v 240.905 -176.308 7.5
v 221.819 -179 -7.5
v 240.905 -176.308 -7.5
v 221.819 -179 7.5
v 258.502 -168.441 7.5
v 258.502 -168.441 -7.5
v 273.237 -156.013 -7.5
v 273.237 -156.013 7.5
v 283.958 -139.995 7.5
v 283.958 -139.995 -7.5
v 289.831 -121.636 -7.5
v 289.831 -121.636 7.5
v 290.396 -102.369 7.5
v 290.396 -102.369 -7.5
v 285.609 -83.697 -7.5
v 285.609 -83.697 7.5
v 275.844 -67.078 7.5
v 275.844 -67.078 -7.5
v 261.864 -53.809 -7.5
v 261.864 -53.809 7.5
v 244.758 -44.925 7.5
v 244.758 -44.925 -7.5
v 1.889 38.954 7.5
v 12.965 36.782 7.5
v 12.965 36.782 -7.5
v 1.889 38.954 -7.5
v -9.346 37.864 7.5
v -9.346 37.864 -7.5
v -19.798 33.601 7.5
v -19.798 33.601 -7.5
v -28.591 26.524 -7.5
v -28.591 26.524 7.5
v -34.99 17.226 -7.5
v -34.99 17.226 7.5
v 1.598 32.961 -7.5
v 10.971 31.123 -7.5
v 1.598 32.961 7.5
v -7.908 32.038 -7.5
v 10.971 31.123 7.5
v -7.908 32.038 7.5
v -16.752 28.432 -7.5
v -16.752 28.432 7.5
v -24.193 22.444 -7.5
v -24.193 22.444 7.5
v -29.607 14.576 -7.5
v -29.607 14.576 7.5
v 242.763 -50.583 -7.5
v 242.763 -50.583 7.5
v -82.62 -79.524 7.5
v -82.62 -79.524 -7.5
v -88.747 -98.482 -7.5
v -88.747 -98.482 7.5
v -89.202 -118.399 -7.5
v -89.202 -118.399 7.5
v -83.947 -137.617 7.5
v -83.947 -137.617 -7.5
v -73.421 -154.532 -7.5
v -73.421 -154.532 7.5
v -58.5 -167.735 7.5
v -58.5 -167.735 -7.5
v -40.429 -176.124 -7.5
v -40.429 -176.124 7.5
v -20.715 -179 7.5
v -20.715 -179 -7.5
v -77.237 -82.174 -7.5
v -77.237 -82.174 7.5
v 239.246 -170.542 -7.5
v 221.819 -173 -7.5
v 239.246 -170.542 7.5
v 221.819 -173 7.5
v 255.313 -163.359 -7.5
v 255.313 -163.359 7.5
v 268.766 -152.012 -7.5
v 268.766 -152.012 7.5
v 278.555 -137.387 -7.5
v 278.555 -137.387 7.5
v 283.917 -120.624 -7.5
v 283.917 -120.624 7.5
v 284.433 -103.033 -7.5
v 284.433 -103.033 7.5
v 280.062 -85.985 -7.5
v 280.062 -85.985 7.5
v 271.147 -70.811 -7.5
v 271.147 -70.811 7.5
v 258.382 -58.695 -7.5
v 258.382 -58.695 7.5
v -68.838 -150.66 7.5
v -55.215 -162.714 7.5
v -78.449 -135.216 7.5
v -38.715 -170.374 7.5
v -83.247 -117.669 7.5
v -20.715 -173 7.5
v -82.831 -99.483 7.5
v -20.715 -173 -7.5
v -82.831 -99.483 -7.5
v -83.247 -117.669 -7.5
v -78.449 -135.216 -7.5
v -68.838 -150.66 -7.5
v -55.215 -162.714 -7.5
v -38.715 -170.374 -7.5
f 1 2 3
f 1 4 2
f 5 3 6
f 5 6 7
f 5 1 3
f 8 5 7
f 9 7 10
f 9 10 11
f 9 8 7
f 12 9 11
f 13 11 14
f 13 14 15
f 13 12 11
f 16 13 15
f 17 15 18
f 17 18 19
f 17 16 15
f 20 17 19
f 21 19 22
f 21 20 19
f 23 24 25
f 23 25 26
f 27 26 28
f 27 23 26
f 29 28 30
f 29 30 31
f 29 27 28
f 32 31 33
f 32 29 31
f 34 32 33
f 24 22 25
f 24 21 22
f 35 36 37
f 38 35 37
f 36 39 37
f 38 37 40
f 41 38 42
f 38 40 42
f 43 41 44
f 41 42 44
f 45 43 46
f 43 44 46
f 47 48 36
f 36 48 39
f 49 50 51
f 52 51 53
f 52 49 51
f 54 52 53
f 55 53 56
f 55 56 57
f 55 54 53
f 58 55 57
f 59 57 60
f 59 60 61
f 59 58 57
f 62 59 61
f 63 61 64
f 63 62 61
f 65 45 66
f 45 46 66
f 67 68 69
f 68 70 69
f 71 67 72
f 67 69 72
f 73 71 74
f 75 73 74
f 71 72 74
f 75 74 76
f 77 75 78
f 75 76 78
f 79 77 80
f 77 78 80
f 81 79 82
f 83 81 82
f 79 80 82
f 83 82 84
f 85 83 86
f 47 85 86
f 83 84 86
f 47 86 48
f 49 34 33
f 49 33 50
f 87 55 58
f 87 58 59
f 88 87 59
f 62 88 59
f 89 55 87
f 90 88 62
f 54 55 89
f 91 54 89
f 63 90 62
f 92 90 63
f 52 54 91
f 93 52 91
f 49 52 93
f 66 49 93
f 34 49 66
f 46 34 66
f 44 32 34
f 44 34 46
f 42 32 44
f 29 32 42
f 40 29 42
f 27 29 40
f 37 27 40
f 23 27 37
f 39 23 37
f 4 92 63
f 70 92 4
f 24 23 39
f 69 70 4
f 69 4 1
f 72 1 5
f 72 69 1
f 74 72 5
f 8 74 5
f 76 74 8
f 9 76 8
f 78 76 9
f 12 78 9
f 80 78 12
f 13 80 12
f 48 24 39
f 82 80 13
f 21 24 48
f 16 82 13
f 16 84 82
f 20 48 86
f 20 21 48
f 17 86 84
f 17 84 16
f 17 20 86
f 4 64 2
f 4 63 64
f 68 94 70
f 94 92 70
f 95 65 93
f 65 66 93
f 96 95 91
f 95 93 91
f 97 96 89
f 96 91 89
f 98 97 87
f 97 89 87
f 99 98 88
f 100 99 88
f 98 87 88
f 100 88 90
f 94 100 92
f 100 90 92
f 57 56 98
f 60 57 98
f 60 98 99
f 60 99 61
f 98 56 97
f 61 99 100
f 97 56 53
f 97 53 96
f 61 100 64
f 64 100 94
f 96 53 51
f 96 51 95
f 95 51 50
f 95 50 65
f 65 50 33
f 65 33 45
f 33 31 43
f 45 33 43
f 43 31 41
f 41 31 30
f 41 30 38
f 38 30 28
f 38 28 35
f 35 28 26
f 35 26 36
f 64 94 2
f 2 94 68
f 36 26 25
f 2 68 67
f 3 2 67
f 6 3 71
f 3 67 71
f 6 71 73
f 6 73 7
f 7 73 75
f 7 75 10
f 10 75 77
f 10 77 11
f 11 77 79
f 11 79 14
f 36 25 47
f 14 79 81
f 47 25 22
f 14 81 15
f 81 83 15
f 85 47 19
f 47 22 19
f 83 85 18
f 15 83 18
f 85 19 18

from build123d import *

# Parameters (mm, degrees)
EXTRUDE_THIN1_DEPTH      = 7.5
EXTRUDE_THIN1_DEPTH_BACK = 7.5


with BuildPart() as part:
    # Sketch2 → Extrude-Thin1 (new, two sides)
    with BuildSketch(Plane.XY) as extrude_thin1_sk:
        with BuildLine():
            Line((244.758005067, -44.924616728), (12.965481959, 36.781738371))
            ThreePointArc((12.965481959, 36.781738371), (-14.726749562, 36.112641102), (-34.989695357, 17.225597779))
            Line((-34.989695357, 17.225597779), (-82.619966134, -79.523942391))
            ThreePointArc((-82.619966134, -79.523942391), (-79.297745807, -146.456494792), (-20.715120503, -179))
            Line((-20.715120503, -179), (221.819075448, -179))
            ThreePointArc((221.819075448, -179), (289.830844451, -121.636119505), (244.758005067, -44.924616728))
        make_face()
        with BuildLine():
            Line((242.763315535, -50.583345709), (10.970792426, 31.123009391))
            ThreePointArc((10.970792426, 31.123009391), (-12.461095783, 30.556850163), (-29.606665302, 14.575505813))
            Line((-29.606665302, 14.575505813), (-77.236936079, -82.174034357))
            ThreePointArc((-77.236936079, -82.174034357), (-74.203604476, -143.28636481), (-20.715120503, -173))
            Line((-20.715120503, -173), (221.819075448, -173))
            ThreePointArc((221.819075448, -173), (283.916777581, -120.624283026), (242.763315535, -50.583345709))
        make_face(mode=Mode.SUBTRACT)
    extrude(amount=EXTRUDE_THIN1_DEPTH)
    extrude(extrude_thin1_sk.sketch, amount=-EXTRUDE_THIN1_DEPTH_BACK)


solid = part.part
